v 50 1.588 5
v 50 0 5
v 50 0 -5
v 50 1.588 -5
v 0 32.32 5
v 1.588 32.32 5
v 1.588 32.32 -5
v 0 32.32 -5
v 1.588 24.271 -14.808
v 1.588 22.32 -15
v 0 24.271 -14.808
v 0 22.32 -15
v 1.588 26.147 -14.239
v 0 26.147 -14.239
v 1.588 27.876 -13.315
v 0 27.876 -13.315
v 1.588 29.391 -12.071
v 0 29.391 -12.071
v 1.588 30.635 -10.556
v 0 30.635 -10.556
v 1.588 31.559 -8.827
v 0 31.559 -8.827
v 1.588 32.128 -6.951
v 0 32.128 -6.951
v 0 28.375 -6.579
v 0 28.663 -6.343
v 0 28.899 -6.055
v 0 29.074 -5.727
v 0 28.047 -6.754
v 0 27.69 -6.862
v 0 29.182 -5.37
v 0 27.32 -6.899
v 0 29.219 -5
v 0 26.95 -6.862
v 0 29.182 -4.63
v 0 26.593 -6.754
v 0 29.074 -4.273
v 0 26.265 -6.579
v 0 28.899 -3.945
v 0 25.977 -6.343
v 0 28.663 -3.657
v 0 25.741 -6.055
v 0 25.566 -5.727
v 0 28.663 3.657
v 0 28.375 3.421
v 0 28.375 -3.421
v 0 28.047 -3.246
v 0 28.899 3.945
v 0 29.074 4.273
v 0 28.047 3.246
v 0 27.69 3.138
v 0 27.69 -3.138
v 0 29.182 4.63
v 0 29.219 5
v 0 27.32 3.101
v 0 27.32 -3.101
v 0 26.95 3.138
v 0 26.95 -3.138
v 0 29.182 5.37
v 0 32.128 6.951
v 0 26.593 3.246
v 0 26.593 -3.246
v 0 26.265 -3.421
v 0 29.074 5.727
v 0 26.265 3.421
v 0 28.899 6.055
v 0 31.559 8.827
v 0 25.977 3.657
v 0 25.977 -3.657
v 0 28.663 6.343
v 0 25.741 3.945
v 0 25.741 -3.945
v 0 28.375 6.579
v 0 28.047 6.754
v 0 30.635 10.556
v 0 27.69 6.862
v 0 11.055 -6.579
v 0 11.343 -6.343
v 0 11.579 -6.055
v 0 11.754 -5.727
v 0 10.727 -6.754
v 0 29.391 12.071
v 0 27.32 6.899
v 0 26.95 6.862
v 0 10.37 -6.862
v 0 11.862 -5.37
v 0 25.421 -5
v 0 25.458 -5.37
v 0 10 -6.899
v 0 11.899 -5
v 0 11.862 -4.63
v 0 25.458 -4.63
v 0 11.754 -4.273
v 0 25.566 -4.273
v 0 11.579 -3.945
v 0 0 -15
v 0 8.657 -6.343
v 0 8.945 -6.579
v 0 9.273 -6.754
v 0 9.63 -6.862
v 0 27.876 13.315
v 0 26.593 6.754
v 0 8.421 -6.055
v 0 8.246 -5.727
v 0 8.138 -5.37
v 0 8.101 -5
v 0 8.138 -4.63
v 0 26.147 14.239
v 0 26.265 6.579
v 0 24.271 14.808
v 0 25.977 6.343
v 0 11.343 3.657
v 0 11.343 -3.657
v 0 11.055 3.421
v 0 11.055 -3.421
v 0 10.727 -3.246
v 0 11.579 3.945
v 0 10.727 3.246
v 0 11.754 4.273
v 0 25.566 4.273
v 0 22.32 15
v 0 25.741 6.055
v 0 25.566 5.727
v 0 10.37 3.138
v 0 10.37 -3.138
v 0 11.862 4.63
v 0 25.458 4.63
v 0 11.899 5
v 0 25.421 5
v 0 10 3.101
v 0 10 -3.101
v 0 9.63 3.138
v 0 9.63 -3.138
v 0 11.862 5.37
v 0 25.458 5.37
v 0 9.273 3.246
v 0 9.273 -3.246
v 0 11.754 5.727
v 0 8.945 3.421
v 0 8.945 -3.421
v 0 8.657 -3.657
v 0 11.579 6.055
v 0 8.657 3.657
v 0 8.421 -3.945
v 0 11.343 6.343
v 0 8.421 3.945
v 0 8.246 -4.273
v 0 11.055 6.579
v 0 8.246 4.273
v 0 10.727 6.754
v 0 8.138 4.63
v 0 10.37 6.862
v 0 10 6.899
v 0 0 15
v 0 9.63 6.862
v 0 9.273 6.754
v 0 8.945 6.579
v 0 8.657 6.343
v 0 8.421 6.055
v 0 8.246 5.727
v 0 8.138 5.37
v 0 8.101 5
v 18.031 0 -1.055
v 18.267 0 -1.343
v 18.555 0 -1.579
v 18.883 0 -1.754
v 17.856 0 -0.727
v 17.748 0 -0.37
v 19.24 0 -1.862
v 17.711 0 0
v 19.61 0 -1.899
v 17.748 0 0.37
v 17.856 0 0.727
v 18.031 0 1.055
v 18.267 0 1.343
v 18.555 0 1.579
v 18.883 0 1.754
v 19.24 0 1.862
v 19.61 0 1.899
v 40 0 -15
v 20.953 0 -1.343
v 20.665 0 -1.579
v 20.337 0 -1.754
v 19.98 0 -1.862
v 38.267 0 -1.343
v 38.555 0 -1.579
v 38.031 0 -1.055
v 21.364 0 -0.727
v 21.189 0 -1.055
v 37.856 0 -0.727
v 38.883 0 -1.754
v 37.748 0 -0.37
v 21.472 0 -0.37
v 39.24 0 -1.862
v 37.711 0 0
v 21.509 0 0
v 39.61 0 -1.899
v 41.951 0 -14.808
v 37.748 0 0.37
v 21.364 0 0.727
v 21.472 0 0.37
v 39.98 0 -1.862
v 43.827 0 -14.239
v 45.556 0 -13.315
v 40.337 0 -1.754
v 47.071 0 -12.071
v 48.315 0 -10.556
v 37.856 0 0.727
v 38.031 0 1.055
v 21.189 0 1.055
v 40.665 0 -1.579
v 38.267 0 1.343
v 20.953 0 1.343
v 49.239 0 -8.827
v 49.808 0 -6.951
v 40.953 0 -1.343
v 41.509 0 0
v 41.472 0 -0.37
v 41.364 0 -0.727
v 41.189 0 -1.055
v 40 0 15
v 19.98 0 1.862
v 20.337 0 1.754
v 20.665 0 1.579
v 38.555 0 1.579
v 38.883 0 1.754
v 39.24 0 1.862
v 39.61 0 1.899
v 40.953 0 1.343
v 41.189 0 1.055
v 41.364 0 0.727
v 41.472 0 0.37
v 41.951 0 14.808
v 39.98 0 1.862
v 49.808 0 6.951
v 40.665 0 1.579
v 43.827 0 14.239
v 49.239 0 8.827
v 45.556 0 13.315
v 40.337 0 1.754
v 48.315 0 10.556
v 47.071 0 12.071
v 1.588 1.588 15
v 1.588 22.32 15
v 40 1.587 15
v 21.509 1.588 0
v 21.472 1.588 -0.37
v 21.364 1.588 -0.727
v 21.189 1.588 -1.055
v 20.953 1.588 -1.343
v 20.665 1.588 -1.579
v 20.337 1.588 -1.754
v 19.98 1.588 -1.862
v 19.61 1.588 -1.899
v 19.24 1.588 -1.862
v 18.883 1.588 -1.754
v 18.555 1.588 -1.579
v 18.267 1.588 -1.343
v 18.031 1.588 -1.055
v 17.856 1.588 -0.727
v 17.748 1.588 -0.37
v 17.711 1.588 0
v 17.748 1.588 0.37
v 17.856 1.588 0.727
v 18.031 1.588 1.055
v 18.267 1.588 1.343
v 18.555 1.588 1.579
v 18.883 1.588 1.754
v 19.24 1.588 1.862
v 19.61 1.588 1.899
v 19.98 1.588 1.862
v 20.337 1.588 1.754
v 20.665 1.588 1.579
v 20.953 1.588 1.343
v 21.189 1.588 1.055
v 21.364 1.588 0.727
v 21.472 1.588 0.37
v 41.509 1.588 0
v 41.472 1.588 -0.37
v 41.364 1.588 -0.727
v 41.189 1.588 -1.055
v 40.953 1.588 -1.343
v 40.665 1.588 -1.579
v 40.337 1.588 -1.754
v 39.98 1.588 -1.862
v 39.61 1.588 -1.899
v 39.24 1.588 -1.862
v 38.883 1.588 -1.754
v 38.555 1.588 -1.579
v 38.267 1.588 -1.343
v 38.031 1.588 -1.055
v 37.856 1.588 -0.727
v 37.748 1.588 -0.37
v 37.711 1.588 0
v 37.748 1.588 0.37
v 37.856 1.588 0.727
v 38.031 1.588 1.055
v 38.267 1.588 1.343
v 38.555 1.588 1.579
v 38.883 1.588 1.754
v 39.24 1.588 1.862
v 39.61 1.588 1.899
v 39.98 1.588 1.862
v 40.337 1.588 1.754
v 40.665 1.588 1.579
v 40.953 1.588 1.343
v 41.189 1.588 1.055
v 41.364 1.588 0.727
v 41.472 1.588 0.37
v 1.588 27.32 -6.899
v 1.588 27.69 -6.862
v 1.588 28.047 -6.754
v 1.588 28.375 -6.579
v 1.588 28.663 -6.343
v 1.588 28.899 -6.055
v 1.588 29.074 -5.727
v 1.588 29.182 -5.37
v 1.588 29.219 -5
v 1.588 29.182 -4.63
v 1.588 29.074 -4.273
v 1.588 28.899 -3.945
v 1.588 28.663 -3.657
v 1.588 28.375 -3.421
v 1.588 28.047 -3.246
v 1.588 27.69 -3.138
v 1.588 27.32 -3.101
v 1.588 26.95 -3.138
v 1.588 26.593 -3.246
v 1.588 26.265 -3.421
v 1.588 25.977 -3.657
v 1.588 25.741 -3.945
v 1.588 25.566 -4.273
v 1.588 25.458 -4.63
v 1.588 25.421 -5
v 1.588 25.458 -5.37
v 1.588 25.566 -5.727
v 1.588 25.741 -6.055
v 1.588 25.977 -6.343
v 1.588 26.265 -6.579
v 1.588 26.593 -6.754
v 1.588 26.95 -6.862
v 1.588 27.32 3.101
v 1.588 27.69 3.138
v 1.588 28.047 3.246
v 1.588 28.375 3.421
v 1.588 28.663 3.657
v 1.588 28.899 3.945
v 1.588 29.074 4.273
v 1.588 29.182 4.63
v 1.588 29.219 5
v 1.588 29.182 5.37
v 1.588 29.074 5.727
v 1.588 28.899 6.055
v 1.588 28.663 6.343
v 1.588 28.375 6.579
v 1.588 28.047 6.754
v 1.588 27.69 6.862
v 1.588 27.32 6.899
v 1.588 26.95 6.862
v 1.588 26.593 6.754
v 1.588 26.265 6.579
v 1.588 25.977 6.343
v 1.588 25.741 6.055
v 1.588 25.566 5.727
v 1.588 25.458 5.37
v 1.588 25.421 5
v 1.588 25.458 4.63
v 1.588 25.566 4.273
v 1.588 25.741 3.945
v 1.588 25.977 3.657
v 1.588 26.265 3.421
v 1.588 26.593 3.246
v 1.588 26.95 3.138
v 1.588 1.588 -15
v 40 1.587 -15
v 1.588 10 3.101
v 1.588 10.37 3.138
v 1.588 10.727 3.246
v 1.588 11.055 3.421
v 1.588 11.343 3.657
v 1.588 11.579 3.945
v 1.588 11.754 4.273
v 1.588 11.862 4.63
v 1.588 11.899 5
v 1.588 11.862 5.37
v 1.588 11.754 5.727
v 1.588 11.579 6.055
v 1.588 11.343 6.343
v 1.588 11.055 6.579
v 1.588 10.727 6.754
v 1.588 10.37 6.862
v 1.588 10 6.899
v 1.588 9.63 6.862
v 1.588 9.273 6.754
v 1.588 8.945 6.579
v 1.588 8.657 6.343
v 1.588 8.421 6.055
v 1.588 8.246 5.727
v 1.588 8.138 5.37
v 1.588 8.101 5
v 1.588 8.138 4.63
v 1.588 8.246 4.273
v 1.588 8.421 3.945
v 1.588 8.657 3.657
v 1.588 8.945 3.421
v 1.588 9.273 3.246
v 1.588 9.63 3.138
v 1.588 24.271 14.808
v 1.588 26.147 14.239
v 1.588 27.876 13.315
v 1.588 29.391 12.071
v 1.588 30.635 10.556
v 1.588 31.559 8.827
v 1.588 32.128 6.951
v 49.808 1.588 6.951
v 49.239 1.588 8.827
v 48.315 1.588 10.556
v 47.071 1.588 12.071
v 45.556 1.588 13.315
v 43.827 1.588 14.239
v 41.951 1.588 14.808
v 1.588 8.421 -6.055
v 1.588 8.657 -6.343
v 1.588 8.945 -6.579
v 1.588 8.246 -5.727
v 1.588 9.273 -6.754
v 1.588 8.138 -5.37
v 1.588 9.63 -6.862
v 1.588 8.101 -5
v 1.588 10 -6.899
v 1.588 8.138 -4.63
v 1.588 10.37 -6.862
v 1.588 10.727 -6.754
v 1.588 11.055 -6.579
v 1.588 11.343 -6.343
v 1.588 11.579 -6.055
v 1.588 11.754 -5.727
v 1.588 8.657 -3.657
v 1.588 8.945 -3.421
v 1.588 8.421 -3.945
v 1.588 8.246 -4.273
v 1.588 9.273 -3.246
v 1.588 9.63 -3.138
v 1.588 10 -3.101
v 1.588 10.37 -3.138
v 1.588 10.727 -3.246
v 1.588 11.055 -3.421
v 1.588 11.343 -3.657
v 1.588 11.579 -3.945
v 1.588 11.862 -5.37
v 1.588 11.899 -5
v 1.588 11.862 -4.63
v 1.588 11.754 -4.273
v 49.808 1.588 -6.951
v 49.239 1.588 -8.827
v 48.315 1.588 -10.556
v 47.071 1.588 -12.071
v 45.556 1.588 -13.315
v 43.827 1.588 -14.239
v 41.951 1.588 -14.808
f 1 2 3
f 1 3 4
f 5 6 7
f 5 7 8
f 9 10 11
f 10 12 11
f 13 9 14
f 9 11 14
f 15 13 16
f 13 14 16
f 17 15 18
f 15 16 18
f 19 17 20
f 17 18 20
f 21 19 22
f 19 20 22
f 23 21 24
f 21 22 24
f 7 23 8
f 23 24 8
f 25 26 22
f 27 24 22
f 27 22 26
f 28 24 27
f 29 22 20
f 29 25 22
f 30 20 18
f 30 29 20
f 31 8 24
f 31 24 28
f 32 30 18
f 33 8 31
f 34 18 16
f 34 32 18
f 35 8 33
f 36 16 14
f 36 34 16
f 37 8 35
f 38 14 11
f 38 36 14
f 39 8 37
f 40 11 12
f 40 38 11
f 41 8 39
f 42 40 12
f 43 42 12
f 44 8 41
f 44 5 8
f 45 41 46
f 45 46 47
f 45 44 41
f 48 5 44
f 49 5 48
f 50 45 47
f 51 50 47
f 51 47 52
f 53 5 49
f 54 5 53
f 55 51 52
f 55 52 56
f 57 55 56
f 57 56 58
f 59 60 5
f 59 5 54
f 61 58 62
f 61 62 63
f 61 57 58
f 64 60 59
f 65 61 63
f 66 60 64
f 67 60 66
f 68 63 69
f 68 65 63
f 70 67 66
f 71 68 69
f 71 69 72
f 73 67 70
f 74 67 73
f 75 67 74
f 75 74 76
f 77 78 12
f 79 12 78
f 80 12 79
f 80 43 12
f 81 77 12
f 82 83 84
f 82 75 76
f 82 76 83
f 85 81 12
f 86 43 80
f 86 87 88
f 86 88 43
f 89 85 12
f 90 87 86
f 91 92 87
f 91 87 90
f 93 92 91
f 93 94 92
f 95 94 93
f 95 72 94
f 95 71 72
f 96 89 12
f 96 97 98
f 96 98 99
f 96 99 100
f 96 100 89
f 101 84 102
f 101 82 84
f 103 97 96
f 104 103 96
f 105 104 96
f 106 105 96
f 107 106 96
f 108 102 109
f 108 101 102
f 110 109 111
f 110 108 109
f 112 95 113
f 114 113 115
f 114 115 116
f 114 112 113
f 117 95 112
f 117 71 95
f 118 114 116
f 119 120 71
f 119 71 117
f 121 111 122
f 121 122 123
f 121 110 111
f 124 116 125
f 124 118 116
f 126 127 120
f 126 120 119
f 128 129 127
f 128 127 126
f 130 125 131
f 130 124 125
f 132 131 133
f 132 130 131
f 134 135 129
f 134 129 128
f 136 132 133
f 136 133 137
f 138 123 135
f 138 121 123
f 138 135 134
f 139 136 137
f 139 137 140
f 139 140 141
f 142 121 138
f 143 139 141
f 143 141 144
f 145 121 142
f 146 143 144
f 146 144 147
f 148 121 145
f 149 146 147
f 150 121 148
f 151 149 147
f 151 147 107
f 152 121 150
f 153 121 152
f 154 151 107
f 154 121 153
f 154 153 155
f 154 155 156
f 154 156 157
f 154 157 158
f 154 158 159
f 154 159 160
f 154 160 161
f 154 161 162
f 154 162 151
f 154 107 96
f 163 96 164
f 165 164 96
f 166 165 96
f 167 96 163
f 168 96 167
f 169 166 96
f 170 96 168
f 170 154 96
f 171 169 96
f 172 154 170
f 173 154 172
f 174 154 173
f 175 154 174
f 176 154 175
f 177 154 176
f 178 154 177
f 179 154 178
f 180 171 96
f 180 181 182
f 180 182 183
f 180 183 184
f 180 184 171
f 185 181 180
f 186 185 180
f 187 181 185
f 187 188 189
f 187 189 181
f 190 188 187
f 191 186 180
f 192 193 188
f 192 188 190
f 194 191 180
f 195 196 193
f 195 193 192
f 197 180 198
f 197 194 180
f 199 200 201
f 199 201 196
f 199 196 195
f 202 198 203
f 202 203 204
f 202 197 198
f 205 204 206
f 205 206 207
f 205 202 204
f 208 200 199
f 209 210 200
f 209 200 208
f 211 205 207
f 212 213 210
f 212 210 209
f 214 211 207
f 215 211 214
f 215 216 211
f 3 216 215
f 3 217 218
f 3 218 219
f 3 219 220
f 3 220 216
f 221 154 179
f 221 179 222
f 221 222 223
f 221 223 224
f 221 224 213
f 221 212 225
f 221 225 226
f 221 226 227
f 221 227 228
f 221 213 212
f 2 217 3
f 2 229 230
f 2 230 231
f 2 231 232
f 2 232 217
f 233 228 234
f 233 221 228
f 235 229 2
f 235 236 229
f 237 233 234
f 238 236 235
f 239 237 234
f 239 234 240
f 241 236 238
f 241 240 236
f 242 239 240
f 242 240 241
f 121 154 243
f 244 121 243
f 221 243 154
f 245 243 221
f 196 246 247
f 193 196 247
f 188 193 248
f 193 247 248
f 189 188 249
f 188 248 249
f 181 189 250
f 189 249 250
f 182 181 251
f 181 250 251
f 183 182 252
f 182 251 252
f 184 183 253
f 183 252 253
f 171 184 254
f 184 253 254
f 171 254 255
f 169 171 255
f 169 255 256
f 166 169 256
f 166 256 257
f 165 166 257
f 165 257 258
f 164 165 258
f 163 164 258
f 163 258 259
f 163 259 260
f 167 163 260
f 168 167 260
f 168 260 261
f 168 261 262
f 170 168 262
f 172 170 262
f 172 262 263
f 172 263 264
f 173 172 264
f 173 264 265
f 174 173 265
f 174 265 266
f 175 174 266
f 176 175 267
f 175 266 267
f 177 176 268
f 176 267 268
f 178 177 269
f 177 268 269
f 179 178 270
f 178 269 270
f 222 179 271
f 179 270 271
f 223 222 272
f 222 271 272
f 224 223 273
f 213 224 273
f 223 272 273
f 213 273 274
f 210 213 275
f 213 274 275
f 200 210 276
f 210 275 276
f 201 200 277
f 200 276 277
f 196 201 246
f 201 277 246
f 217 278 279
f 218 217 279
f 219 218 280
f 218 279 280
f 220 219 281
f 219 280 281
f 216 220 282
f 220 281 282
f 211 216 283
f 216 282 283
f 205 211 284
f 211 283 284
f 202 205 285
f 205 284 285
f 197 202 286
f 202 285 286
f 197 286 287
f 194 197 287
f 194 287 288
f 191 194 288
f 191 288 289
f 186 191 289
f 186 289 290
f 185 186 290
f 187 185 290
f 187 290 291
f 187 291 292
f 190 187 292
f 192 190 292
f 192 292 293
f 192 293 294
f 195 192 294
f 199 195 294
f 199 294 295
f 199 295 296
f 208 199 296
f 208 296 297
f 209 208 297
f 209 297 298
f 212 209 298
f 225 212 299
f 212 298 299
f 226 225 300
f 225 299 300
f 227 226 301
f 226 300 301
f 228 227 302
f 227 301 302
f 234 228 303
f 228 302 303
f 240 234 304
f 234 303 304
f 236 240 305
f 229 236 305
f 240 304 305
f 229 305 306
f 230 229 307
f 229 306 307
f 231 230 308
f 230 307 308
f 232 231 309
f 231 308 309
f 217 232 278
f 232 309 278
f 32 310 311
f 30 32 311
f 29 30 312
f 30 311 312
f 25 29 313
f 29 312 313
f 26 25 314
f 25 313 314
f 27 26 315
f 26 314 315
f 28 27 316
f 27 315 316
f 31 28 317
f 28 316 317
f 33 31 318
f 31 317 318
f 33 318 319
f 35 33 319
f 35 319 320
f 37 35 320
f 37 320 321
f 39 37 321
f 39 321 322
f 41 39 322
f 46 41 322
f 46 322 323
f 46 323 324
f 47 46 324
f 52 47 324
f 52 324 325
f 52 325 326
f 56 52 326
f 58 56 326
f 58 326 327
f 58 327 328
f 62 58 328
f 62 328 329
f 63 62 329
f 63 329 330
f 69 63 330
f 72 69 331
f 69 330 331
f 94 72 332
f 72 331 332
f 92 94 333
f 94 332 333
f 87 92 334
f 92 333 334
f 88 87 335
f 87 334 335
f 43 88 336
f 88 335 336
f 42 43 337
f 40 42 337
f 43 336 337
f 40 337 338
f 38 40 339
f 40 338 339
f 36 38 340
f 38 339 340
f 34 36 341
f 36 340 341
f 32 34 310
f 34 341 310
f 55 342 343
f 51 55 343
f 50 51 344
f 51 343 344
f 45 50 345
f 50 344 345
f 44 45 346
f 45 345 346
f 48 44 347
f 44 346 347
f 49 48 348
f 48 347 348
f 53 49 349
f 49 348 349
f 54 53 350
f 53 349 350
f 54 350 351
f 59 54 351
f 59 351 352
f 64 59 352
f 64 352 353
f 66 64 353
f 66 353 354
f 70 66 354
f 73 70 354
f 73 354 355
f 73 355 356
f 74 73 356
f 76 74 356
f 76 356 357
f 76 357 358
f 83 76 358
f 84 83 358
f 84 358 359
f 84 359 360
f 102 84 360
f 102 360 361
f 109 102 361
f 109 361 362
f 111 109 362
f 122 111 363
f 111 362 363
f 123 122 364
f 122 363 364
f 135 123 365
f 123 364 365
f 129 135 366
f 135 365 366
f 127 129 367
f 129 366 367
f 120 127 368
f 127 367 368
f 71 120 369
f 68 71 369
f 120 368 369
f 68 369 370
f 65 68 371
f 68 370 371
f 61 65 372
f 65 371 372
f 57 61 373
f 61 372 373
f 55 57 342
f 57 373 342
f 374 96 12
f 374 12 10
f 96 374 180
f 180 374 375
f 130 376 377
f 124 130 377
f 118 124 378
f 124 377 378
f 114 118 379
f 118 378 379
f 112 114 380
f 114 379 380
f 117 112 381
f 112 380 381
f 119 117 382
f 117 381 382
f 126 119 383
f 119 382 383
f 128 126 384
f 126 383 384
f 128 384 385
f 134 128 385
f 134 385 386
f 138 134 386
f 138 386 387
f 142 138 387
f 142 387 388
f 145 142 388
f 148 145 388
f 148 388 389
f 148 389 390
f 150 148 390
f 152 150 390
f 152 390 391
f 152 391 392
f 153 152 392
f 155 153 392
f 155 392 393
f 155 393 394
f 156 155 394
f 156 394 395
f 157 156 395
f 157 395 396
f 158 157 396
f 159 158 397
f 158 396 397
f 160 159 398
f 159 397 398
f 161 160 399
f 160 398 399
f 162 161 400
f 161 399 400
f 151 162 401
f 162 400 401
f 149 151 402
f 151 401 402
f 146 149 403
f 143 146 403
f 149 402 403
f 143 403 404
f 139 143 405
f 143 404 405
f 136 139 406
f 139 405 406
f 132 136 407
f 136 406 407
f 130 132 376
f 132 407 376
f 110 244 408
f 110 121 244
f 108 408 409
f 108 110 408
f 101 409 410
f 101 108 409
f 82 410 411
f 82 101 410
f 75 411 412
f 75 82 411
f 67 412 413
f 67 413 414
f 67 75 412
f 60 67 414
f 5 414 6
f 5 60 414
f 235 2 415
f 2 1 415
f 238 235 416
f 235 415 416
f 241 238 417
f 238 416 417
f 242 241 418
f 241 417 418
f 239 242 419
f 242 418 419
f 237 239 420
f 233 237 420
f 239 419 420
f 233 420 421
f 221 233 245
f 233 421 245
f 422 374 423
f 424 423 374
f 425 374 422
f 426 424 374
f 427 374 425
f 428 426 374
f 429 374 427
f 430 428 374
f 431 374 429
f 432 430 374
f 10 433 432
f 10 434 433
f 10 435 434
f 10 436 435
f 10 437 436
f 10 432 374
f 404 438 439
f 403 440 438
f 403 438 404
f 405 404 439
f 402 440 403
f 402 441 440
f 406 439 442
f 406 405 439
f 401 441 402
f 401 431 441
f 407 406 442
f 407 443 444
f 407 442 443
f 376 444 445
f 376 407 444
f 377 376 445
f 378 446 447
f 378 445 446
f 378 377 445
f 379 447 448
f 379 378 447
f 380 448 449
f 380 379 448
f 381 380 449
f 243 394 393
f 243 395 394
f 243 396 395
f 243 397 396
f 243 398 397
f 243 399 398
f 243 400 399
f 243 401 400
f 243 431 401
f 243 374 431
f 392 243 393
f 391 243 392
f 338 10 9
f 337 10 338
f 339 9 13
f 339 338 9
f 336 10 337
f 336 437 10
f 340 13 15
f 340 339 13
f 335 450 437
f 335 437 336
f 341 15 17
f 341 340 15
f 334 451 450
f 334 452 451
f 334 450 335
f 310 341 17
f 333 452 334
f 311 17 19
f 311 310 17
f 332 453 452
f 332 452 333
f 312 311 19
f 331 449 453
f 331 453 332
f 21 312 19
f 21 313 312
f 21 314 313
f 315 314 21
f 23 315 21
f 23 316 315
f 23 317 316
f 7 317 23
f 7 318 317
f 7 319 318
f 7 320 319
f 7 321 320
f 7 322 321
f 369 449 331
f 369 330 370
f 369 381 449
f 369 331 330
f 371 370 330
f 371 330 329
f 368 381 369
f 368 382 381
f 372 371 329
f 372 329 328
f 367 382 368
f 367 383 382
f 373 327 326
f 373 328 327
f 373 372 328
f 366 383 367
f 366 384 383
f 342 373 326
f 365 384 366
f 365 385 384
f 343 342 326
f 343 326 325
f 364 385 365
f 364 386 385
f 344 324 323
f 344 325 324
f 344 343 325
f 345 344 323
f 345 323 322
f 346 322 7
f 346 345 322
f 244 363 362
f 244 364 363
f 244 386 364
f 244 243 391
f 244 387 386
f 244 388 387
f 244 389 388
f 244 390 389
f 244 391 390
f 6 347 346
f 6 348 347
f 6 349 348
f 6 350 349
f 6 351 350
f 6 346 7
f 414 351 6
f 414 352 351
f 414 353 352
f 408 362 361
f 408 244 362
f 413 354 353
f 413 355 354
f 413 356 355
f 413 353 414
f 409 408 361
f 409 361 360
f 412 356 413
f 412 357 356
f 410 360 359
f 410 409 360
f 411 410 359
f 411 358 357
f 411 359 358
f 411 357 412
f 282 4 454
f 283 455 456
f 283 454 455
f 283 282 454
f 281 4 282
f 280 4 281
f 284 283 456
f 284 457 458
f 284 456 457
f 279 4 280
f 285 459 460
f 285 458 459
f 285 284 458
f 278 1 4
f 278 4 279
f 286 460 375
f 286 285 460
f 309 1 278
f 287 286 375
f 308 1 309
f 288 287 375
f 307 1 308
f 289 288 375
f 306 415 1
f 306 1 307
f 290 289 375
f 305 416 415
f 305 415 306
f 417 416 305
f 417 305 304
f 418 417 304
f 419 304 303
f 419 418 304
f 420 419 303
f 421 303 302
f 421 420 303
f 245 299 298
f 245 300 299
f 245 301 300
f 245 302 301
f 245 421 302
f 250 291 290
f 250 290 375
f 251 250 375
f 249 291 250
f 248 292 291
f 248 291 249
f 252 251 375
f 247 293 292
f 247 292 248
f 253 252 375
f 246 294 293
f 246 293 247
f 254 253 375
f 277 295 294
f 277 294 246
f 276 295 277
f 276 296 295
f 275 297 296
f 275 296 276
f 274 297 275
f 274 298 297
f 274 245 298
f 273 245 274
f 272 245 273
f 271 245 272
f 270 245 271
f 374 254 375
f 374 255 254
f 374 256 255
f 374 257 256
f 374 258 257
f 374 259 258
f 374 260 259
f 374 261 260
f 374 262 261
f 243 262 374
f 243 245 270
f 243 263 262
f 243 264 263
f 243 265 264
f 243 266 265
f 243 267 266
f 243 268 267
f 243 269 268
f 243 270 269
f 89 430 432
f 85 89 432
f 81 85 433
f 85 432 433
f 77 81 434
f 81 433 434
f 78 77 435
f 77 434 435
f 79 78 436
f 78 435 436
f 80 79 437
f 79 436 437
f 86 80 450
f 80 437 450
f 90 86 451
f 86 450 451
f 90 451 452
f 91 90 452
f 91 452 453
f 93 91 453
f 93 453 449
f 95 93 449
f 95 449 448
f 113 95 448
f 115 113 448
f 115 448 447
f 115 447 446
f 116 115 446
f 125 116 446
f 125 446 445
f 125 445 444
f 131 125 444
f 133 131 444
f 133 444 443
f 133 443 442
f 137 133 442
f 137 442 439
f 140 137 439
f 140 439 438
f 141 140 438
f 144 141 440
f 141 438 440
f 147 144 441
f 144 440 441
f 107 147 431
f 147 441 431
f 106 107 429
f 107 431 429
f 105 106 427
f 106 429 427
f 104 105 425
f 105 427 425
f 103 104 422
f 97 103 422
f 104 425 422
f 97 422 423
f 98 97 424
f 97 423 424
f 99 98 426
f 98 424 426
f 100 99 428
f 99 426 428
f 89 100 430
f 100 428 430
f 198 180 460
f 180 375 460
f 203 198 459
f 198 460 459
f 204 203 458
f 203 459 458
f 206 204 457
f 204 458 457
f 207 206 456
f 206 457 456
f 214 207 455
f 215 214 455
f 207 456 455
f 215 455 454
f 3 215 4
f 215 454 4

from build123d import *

# Parameters (mm, degrees)
BOSS_EXTRUDE1_DEPTH   = 15
F_6_CLEARANCE_HOLE1_D = 3.7973
FILLET1_R             = 10
F_6_CLEARANCE_HOLE2_D = 3.7973


with BuildPart() as part:
    # Sketch2 → Boss-Extrude1 (new, symmetric)
    with BuildSketch(Plane.XY):
        Polygon((0, 0), (50, 0), (50, 1.5875), (1.5875, 1.5875), (1.5875, 32.32), (0, 32.32), align=None)
    extrude(amount=BOSS_EXTRUDE1_DEPTH, both=True)

    # #6 Clearance Hole1 (through all)
    with Locations(Plane.ZY):
        with Locations((-5, 27.32), (5, 10), (5, 27.32), (-5, 10)):
            Hole(F_6_CLEARANCE_HOLE1_D / 2)

    # Fillet1
    fillet1_edges = [part.edges().sort_by_distance(p)[0] for p in [
        (50, 0.79375, 15),
        (0.79375, 32.32, 15),
        (0.79375, 32.32, -15),
        (50, 0.79375, -15),
    ]]
    fillet(fillet1_edges, radius=FILLET1_R)

    # #6 Clearance Hole2 (through all)
    with Locations(Plane(origin=(0, 0, 0), x_dir=(-1, 0, 0), z_dir=(0, -1, 0))):
        with Locations((-19.61, 0), (-39.61, 0)):
            Hole(F_6_CLEARANCE_HOLE2_D / 2)


solid = part.part
